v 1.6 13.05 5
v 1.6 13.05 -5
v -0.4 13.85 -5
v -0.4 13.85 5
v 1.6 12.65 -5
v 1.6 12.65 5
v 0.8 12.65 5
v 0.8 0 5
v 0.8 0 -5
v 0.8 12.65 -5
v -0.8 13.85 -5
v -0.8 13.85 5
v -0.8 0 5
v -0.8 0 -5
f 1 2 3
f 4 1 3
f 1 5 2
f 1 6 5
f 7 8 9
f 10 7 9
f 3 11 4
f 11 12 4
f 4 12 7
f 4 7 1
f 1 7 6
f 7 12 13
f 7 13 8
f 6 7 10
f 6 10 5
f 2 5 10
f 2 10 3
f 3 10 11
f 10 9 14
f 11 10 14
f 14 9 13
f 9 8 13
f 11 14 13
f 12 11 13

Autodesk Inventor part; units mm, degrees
ref_plane "YZ Plane" through (0, 0, 0) normal (1, 0, 0) x (0, 1, 0)
ref_plane "XZ Plane" through (0, 0, 0) normal (0, 1, 0) x (-1, 0, 0)
ref_plane "XY Plane" through (0, 0, 0) normal (0, 0, 1) x (1, 0, 0)
sketch "Sketch1" plane through (0, 0, 0) normal (0, 1, 0) x (-1, 0, 0)
  line L0 (-0.8, -5) -> (0.8, -5)
  line L1 (0.8, -5) -> (0.8, 5)
  line L2 (0.8, 5) -> (-0.8, 5)
  line L3 (-0.8, 5) -> (-0.8, -5)
  line L4 (-0.8, -5) -> (0.8, 5) construction
  line L5 (0.8, -5) -> (-0.8, 5) construction
  point P0 (0, 0)
  dimension "length" = 10
  dimension "width" = 1.6
extrude "Extrusion1" add sketch "Sketch1" along normal blind 12.65
sketch "Sketch3" plane through (-0.8, 0, 5) normal (0, 0, 1) x (1, 0, 0)
  line L0 (1.6, 12.65) -> (2.4, 12.65)
  line L1 (1.6, 0) -> (1.6, 12.65)
  line L2 (2.4, 12.65) -> (2.4, 13.05)
  line L3 (0, 13.85) -> (0.4, 13.85)
  line L4 (2.4, 13.05) -> (0.4, 13.85)
  line L5 (0, 0) -> (0, 12.65) projected
  line L6 (0, 0) -> (0, 12.65) projected
  line L7 (0, 13.85) -> (0, 12.65)
  line L8 (0, 12.65) -> (1.6, 12.65)
  line L9 (1.6, 0) -> (1.6, 12.65) projected
  point P0 (0.8, 0)
  dimension "fixer" = 0.8
  dimension "d8" = 0.4
  dimension "d11" = 0.4
  dimension "d12" = 1.2
extrude "Extrusion2" add sketch "Sketch3" against normal blind 10
equation "\"d6\" = length"
equation "\"TOL\" = 0.15"
properties part number "straight"
